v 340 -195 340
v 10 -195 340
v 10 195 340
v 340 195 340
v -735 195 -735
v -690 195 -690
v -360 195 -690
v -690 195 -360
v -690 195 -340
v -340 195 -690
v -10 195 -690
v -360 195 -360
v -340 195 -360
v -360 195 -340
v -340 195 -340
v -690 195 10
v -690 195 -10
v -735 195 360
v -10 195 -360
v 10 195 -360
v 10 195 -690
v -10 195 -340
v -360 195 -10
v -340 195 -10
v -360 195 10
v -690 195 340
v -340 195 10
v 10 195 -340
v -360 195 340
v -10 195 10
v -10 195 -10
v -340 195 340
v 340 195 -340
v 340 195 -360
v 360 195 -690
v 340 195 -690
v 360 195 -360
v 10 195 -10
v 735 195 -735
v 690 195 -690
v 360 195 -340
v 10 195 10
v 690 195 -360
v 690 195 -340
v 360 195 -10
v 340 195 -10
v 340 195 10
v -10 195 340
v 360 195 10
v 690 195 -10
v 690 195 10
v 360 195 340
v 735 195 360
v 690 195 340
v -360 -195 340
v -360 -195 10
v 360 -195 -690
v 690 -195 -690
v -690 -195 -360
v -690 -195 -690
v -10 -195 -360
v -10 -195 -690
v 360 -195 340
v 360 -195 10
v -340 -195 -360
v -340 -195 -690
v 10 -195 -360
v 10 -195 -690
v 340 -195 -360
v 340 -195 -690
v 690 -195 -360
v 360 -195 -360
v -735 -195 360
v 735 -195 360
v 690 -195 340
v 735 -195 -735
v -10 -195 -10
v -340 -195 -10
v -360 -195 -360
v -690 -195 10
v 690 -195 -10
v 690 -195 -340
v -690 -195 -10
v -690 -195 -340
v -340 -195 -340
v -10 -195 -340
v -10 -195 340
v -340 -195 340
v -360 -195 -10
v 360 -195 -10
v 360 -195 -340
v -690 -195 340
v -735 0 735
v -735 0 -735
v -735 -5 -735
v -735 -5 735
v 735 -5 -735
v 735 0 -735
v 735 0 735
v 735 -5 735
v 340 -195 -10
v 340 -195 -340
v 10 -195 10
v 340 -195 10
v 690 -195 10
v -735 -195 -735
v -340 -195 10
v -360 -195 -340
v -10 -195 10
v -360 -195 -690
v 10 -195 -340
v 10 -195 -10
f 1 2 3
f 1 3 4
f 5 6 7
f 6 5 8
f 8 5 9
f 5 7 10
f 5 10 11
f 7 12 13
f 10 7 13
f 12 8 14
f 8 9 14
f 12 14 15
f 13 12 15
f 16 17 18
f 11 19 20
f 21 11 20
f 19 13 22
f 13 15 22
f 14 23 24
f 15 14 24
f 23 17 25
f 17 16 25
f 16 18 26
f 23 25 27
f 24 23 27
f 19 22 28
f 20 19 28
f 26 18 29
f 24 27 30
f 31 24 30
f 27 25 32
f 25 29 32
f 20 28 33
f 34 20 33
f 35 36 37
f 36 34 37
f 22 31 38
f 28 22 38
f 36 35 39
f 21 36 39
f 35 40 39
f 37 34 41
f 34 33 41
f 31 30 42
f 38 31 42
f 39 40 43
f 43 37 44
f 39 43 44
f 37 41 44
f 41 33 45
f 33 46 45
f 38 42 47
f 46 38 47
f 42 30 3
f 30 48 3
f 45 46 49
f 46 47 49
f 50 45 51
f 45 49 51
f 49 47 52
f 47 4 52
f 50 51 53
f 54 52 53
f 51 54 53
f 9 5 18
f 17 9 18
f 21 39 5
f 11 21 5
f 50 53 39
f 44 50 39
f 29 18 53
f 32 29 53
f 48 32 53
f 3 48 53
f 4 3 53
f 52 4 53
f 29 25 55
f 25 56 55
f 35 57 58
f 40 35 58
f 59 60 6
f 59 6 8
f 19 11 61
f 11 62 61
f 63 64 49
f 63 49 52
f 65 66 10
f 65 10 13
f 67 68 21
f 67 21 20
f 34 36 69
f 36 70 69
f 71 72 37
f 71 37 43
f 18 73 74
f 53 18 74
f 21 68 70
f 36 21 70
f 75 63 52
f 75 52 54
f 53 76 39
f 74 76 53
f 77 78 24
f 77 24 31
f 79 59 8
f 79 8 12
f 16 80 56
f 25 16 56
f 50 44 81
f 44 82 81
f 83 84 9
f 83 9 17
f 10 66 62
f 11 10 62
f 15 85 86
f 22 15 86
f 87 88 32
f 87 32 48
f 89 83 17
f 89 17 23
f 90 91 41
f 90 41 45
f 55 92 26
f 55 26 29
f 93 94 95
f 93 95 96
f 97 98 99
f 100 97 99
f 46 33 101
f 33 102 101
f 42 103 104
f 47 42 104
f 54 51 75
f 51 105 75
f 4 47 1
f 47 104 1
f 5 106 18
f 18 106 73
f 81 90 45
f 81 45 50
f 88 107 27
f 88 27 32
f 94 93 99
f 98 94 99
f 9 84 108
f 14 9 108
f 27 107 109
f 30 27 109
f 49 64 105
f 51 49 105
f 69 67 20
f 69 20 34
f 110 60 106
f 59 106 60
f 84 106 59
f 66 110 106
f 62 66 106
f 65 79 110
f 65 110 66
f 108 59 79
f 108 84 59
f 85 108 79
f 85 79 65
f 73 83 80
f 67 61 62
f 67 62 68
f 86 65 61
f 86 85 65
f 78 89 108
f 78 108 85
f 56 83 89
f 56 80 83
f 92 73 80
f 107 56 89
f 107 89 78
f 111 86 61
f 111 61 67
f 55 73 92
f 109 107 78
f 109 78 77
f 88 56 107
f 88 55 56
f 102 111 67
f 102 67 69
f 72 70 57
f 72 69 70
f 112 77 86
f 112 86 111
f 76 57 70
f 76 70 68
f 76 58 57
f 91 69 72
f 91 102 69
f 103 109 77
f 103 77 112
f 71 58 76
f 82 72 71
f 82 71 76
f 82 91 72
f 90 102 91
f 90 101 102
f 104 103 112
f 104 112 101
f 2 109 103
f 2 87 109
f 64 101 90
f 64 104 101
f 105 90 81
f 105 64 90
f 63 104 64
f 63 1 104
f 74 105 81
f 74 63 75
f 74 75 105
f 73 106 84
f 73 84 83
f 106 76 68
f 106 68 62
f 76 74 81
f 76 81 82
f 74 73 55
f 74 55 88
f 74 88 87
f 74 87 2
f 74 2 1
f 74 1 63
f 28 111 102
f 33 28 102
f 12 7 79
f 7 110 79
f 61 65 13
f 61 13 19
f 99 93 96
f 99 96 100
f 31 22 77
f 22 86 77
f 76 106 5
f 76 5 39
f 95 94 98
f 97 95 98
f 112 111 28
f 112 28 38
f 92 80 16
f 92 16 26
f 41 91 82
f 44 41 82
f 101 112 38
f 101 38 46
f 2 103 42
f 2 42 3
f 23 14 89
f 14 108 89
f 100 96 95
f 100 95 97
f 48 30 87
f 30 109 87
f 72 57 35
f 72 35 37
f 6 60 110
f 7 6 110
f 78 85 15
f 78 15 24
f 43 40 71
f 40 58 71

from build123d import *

# Parameters (mm, degrees)
F0_W     = 1470
F0_H     = 1470
F0_W_2   = 330
F0_H_2   = 330
F1_DEPTH = 195
F2_DEPTH = 5
F3_DEPTH = 375


with BuildPart() as f1:
    # F0 (on Front) → F1 (new body, symmetric)
    with BuildSketch(Plane.XZ):
        Rectangle(F0_W, F0_H)
        with Locations((-525, -525)):
            Rectangle(F0_W_2, F0_H_2, mode=Mode.SUBTRACT)
        with Locations((-175, -525)):
            Rectangle(F0_W_2, F0_H_2, mode=Mode.SUBTRACT)
        with Locations((-525, -175)):
            Rectangle(F0_W_2, F0_H_2, mode=Mode.SUBTRACT)
        with Locations((-175, -175)):
            Rectangle(F0_W_2, F0_H_2, mode=Mode.SUBTRACT)
        with Locations((175, -525)):
            Rectangle(F0_W_2, F0_H_2, mode=Mode.SUBTRACT)
        with Locations((525, -525)):
            Rectangle(F0_W_2, F0_H_2, mode=Mode.SUBTRACT)
        with Locations((175, -175)):
            Rectangle(F0_W_2, F0_H_2, mode=Mode.SUBTRACT)
        with Locations((525, -175)):
            Rectangle(F0_W_2, F0_H_2, mode=Mode.SUBTRACT)
        with Locations((-525, 175)):
            Rectangle(F0_W_2, F0_H_2, mode=Mode.SUBTRACT)
        with Locations((-175, 175)):
            Rectangle(F0_W_2, F0_H_2, mode=Mode.SUBTRACT)
        with Locations((-525, 525)):
            Rectangle(F0_W_2, F0_H_2, mode=Mode.SUBTRACT)
        with Locations((-175, 525)):
            Rectangle(F0_W_2, F0_H_2, mode=Mode.SUBTRACT)
        with Locations((175, 175)):
            Rectangle(F0_W_2, F0_H_2, mode=Mode.SUBTRACT)
        with Locations((525, 175)):
            Rectangle(F0_W_2, F0_H_2, mode=Mode.SUBTRACT)
        with Locations((175, 525)):
            Rectangle(F0_W_2, F0_H_2, mode=Mode.SUBTRACT)
        with Locations((525, 525)):
            Rectangle(F0_W_2, F0_H_2, mode=Mode.SUBTRACT)
    extrude(amount=F1_DEPTH, both=True)

    # F3 (cut, through all): a face of the model
    f3_faces = [f1.faces().sort_by_distance(p)[0] for p in [
        (0, 0, 735),
    ]]
    extrude(f3_faces, amount=-F3_DEPTH, mode=Mode.SUBTRACT)


with BuildPart() as f2:
    # F0 (on Front) → F2 (new body)
    with BuildSketch(Plane.XZ):
        Rectangle(F0_W, F0_H)
        with Locations((-525, -525)):
            Rectangle(F0_W_2, F0_H_2, mode=Mode.SUBTRACT)
        with Locations((-175, -525)):
            Rectangle(F0_W_2, F0_H_2, mode=Mode.SUBTRACT)
        with Locations((-525, -175)):
            Rectangle(F0_W_2, F0_H_2, mode=Mode.SUBTRACT)
        with Locations((-175, -175)):
            Rectangle(F0_W_2, F0_H_2, mode=Mode.SUBTRACT)
        with Locations((175, -525)):
            Rectangle(F0_W_2, F0_H_2, mode=Mode.SUBTRACT)
        with Locations((525, -525)):
            Rectangle(F0_W_2, F0_H_2, mode=Mode.SUBTRACT)
        with Locations((175, -175)):
            Rectangle(F0_W_2, F0_H_2, mode=Mode.SUBTRACT)
        with Locations((525, -175)):
            Rectangle(F0_W_2, F0_H_2, mode=Mode.SUBTRACT)
        with Locations((-525, 175)):
            Rectangle(F0_W_2, F0_H_2, mode=Mode.SUBTRACT)
        with Locations((-175, 175)):
            Rectangle(F0_W_2, F0_H_2, mode=Mode.SUBTRACT)
        with Locations((-525, 525)):
            Rectangle(F0_W_2, F0_H_2, mode=Mode.SUBTRACT)
        with Locations((-175, 525)):
            Rectangle(F0_W_2, F0_H_2, mode=Mode.SUBTRACT)
        with Locations((175, 175)):
            Rectangle(F0_W_2, F0_H_2, mode=Mode.SUBTRACT)
        with Locations((525, 175)):
            Rectangle(F0_W_2, F0_H_2, mode=Mode.SUBTRACT)
        with Locations((175, 525)):
            Rectangle(F0_W_2, F0_H_2, mode=Mode.SUBTRACT)
        with Locations((525, 525)):
            Rectangle(F0_W_2, F0_H_2, mode=Mode.SUBTRACT)
        with Locations((525, 525)):
            Rectangle(F0_W_2, F0_H_2)
        with Locations((175, 525)):
            Rectangle(F0_W_2, F0_H_2)
        with Locations((-175, 525)):
            Rectangle(F0_W_2, F0_H_2)
        with Locations((-525, 525)):
            Rectangle(F0_W_2, F0_H_2)
        with Locations((-525, 175)):
            Rectangle(F0_W_2, F0_H_2)
        with Locations((-175, 175)):
            Rectangle(F0_W_2, F0_H_2)
        with Locations((-175, -175)):
            Rectangle(F0_W_2, F0_H_2)
        with Locations((-525, -175)):
            Rectangle(F0_W_2, F0_H_2)
        with Locations((-525, -525)):
            Rectangle(F0_W_2, F0_H_2)
        with Locations((-175, -525)):
            Rectangle(F0_W_2, F0_H_2)
        with Locations((175, -525)):
            Rectangle(F0_W_2, F0_H_2)
        with Locations((525, -525)):
            Rectangle(F0_W_2, F0_H_2)
        with Locations((525, -175)):
            Rectangle(F0_W_2, F0_H_2)
        with Locations((525, 175)):
            Rectangle(F0_W_2, F0_H_2)
        with Locations((175, 175)):
            Rectangle(F0_W_2, F0_H_2)
        with Locations((175, -175)):
            Rectangle(F0_W_2, F0_H_2)
    extrude(amount=F2_DEPTH)


solid = Compound([f1.part, f2.part])
